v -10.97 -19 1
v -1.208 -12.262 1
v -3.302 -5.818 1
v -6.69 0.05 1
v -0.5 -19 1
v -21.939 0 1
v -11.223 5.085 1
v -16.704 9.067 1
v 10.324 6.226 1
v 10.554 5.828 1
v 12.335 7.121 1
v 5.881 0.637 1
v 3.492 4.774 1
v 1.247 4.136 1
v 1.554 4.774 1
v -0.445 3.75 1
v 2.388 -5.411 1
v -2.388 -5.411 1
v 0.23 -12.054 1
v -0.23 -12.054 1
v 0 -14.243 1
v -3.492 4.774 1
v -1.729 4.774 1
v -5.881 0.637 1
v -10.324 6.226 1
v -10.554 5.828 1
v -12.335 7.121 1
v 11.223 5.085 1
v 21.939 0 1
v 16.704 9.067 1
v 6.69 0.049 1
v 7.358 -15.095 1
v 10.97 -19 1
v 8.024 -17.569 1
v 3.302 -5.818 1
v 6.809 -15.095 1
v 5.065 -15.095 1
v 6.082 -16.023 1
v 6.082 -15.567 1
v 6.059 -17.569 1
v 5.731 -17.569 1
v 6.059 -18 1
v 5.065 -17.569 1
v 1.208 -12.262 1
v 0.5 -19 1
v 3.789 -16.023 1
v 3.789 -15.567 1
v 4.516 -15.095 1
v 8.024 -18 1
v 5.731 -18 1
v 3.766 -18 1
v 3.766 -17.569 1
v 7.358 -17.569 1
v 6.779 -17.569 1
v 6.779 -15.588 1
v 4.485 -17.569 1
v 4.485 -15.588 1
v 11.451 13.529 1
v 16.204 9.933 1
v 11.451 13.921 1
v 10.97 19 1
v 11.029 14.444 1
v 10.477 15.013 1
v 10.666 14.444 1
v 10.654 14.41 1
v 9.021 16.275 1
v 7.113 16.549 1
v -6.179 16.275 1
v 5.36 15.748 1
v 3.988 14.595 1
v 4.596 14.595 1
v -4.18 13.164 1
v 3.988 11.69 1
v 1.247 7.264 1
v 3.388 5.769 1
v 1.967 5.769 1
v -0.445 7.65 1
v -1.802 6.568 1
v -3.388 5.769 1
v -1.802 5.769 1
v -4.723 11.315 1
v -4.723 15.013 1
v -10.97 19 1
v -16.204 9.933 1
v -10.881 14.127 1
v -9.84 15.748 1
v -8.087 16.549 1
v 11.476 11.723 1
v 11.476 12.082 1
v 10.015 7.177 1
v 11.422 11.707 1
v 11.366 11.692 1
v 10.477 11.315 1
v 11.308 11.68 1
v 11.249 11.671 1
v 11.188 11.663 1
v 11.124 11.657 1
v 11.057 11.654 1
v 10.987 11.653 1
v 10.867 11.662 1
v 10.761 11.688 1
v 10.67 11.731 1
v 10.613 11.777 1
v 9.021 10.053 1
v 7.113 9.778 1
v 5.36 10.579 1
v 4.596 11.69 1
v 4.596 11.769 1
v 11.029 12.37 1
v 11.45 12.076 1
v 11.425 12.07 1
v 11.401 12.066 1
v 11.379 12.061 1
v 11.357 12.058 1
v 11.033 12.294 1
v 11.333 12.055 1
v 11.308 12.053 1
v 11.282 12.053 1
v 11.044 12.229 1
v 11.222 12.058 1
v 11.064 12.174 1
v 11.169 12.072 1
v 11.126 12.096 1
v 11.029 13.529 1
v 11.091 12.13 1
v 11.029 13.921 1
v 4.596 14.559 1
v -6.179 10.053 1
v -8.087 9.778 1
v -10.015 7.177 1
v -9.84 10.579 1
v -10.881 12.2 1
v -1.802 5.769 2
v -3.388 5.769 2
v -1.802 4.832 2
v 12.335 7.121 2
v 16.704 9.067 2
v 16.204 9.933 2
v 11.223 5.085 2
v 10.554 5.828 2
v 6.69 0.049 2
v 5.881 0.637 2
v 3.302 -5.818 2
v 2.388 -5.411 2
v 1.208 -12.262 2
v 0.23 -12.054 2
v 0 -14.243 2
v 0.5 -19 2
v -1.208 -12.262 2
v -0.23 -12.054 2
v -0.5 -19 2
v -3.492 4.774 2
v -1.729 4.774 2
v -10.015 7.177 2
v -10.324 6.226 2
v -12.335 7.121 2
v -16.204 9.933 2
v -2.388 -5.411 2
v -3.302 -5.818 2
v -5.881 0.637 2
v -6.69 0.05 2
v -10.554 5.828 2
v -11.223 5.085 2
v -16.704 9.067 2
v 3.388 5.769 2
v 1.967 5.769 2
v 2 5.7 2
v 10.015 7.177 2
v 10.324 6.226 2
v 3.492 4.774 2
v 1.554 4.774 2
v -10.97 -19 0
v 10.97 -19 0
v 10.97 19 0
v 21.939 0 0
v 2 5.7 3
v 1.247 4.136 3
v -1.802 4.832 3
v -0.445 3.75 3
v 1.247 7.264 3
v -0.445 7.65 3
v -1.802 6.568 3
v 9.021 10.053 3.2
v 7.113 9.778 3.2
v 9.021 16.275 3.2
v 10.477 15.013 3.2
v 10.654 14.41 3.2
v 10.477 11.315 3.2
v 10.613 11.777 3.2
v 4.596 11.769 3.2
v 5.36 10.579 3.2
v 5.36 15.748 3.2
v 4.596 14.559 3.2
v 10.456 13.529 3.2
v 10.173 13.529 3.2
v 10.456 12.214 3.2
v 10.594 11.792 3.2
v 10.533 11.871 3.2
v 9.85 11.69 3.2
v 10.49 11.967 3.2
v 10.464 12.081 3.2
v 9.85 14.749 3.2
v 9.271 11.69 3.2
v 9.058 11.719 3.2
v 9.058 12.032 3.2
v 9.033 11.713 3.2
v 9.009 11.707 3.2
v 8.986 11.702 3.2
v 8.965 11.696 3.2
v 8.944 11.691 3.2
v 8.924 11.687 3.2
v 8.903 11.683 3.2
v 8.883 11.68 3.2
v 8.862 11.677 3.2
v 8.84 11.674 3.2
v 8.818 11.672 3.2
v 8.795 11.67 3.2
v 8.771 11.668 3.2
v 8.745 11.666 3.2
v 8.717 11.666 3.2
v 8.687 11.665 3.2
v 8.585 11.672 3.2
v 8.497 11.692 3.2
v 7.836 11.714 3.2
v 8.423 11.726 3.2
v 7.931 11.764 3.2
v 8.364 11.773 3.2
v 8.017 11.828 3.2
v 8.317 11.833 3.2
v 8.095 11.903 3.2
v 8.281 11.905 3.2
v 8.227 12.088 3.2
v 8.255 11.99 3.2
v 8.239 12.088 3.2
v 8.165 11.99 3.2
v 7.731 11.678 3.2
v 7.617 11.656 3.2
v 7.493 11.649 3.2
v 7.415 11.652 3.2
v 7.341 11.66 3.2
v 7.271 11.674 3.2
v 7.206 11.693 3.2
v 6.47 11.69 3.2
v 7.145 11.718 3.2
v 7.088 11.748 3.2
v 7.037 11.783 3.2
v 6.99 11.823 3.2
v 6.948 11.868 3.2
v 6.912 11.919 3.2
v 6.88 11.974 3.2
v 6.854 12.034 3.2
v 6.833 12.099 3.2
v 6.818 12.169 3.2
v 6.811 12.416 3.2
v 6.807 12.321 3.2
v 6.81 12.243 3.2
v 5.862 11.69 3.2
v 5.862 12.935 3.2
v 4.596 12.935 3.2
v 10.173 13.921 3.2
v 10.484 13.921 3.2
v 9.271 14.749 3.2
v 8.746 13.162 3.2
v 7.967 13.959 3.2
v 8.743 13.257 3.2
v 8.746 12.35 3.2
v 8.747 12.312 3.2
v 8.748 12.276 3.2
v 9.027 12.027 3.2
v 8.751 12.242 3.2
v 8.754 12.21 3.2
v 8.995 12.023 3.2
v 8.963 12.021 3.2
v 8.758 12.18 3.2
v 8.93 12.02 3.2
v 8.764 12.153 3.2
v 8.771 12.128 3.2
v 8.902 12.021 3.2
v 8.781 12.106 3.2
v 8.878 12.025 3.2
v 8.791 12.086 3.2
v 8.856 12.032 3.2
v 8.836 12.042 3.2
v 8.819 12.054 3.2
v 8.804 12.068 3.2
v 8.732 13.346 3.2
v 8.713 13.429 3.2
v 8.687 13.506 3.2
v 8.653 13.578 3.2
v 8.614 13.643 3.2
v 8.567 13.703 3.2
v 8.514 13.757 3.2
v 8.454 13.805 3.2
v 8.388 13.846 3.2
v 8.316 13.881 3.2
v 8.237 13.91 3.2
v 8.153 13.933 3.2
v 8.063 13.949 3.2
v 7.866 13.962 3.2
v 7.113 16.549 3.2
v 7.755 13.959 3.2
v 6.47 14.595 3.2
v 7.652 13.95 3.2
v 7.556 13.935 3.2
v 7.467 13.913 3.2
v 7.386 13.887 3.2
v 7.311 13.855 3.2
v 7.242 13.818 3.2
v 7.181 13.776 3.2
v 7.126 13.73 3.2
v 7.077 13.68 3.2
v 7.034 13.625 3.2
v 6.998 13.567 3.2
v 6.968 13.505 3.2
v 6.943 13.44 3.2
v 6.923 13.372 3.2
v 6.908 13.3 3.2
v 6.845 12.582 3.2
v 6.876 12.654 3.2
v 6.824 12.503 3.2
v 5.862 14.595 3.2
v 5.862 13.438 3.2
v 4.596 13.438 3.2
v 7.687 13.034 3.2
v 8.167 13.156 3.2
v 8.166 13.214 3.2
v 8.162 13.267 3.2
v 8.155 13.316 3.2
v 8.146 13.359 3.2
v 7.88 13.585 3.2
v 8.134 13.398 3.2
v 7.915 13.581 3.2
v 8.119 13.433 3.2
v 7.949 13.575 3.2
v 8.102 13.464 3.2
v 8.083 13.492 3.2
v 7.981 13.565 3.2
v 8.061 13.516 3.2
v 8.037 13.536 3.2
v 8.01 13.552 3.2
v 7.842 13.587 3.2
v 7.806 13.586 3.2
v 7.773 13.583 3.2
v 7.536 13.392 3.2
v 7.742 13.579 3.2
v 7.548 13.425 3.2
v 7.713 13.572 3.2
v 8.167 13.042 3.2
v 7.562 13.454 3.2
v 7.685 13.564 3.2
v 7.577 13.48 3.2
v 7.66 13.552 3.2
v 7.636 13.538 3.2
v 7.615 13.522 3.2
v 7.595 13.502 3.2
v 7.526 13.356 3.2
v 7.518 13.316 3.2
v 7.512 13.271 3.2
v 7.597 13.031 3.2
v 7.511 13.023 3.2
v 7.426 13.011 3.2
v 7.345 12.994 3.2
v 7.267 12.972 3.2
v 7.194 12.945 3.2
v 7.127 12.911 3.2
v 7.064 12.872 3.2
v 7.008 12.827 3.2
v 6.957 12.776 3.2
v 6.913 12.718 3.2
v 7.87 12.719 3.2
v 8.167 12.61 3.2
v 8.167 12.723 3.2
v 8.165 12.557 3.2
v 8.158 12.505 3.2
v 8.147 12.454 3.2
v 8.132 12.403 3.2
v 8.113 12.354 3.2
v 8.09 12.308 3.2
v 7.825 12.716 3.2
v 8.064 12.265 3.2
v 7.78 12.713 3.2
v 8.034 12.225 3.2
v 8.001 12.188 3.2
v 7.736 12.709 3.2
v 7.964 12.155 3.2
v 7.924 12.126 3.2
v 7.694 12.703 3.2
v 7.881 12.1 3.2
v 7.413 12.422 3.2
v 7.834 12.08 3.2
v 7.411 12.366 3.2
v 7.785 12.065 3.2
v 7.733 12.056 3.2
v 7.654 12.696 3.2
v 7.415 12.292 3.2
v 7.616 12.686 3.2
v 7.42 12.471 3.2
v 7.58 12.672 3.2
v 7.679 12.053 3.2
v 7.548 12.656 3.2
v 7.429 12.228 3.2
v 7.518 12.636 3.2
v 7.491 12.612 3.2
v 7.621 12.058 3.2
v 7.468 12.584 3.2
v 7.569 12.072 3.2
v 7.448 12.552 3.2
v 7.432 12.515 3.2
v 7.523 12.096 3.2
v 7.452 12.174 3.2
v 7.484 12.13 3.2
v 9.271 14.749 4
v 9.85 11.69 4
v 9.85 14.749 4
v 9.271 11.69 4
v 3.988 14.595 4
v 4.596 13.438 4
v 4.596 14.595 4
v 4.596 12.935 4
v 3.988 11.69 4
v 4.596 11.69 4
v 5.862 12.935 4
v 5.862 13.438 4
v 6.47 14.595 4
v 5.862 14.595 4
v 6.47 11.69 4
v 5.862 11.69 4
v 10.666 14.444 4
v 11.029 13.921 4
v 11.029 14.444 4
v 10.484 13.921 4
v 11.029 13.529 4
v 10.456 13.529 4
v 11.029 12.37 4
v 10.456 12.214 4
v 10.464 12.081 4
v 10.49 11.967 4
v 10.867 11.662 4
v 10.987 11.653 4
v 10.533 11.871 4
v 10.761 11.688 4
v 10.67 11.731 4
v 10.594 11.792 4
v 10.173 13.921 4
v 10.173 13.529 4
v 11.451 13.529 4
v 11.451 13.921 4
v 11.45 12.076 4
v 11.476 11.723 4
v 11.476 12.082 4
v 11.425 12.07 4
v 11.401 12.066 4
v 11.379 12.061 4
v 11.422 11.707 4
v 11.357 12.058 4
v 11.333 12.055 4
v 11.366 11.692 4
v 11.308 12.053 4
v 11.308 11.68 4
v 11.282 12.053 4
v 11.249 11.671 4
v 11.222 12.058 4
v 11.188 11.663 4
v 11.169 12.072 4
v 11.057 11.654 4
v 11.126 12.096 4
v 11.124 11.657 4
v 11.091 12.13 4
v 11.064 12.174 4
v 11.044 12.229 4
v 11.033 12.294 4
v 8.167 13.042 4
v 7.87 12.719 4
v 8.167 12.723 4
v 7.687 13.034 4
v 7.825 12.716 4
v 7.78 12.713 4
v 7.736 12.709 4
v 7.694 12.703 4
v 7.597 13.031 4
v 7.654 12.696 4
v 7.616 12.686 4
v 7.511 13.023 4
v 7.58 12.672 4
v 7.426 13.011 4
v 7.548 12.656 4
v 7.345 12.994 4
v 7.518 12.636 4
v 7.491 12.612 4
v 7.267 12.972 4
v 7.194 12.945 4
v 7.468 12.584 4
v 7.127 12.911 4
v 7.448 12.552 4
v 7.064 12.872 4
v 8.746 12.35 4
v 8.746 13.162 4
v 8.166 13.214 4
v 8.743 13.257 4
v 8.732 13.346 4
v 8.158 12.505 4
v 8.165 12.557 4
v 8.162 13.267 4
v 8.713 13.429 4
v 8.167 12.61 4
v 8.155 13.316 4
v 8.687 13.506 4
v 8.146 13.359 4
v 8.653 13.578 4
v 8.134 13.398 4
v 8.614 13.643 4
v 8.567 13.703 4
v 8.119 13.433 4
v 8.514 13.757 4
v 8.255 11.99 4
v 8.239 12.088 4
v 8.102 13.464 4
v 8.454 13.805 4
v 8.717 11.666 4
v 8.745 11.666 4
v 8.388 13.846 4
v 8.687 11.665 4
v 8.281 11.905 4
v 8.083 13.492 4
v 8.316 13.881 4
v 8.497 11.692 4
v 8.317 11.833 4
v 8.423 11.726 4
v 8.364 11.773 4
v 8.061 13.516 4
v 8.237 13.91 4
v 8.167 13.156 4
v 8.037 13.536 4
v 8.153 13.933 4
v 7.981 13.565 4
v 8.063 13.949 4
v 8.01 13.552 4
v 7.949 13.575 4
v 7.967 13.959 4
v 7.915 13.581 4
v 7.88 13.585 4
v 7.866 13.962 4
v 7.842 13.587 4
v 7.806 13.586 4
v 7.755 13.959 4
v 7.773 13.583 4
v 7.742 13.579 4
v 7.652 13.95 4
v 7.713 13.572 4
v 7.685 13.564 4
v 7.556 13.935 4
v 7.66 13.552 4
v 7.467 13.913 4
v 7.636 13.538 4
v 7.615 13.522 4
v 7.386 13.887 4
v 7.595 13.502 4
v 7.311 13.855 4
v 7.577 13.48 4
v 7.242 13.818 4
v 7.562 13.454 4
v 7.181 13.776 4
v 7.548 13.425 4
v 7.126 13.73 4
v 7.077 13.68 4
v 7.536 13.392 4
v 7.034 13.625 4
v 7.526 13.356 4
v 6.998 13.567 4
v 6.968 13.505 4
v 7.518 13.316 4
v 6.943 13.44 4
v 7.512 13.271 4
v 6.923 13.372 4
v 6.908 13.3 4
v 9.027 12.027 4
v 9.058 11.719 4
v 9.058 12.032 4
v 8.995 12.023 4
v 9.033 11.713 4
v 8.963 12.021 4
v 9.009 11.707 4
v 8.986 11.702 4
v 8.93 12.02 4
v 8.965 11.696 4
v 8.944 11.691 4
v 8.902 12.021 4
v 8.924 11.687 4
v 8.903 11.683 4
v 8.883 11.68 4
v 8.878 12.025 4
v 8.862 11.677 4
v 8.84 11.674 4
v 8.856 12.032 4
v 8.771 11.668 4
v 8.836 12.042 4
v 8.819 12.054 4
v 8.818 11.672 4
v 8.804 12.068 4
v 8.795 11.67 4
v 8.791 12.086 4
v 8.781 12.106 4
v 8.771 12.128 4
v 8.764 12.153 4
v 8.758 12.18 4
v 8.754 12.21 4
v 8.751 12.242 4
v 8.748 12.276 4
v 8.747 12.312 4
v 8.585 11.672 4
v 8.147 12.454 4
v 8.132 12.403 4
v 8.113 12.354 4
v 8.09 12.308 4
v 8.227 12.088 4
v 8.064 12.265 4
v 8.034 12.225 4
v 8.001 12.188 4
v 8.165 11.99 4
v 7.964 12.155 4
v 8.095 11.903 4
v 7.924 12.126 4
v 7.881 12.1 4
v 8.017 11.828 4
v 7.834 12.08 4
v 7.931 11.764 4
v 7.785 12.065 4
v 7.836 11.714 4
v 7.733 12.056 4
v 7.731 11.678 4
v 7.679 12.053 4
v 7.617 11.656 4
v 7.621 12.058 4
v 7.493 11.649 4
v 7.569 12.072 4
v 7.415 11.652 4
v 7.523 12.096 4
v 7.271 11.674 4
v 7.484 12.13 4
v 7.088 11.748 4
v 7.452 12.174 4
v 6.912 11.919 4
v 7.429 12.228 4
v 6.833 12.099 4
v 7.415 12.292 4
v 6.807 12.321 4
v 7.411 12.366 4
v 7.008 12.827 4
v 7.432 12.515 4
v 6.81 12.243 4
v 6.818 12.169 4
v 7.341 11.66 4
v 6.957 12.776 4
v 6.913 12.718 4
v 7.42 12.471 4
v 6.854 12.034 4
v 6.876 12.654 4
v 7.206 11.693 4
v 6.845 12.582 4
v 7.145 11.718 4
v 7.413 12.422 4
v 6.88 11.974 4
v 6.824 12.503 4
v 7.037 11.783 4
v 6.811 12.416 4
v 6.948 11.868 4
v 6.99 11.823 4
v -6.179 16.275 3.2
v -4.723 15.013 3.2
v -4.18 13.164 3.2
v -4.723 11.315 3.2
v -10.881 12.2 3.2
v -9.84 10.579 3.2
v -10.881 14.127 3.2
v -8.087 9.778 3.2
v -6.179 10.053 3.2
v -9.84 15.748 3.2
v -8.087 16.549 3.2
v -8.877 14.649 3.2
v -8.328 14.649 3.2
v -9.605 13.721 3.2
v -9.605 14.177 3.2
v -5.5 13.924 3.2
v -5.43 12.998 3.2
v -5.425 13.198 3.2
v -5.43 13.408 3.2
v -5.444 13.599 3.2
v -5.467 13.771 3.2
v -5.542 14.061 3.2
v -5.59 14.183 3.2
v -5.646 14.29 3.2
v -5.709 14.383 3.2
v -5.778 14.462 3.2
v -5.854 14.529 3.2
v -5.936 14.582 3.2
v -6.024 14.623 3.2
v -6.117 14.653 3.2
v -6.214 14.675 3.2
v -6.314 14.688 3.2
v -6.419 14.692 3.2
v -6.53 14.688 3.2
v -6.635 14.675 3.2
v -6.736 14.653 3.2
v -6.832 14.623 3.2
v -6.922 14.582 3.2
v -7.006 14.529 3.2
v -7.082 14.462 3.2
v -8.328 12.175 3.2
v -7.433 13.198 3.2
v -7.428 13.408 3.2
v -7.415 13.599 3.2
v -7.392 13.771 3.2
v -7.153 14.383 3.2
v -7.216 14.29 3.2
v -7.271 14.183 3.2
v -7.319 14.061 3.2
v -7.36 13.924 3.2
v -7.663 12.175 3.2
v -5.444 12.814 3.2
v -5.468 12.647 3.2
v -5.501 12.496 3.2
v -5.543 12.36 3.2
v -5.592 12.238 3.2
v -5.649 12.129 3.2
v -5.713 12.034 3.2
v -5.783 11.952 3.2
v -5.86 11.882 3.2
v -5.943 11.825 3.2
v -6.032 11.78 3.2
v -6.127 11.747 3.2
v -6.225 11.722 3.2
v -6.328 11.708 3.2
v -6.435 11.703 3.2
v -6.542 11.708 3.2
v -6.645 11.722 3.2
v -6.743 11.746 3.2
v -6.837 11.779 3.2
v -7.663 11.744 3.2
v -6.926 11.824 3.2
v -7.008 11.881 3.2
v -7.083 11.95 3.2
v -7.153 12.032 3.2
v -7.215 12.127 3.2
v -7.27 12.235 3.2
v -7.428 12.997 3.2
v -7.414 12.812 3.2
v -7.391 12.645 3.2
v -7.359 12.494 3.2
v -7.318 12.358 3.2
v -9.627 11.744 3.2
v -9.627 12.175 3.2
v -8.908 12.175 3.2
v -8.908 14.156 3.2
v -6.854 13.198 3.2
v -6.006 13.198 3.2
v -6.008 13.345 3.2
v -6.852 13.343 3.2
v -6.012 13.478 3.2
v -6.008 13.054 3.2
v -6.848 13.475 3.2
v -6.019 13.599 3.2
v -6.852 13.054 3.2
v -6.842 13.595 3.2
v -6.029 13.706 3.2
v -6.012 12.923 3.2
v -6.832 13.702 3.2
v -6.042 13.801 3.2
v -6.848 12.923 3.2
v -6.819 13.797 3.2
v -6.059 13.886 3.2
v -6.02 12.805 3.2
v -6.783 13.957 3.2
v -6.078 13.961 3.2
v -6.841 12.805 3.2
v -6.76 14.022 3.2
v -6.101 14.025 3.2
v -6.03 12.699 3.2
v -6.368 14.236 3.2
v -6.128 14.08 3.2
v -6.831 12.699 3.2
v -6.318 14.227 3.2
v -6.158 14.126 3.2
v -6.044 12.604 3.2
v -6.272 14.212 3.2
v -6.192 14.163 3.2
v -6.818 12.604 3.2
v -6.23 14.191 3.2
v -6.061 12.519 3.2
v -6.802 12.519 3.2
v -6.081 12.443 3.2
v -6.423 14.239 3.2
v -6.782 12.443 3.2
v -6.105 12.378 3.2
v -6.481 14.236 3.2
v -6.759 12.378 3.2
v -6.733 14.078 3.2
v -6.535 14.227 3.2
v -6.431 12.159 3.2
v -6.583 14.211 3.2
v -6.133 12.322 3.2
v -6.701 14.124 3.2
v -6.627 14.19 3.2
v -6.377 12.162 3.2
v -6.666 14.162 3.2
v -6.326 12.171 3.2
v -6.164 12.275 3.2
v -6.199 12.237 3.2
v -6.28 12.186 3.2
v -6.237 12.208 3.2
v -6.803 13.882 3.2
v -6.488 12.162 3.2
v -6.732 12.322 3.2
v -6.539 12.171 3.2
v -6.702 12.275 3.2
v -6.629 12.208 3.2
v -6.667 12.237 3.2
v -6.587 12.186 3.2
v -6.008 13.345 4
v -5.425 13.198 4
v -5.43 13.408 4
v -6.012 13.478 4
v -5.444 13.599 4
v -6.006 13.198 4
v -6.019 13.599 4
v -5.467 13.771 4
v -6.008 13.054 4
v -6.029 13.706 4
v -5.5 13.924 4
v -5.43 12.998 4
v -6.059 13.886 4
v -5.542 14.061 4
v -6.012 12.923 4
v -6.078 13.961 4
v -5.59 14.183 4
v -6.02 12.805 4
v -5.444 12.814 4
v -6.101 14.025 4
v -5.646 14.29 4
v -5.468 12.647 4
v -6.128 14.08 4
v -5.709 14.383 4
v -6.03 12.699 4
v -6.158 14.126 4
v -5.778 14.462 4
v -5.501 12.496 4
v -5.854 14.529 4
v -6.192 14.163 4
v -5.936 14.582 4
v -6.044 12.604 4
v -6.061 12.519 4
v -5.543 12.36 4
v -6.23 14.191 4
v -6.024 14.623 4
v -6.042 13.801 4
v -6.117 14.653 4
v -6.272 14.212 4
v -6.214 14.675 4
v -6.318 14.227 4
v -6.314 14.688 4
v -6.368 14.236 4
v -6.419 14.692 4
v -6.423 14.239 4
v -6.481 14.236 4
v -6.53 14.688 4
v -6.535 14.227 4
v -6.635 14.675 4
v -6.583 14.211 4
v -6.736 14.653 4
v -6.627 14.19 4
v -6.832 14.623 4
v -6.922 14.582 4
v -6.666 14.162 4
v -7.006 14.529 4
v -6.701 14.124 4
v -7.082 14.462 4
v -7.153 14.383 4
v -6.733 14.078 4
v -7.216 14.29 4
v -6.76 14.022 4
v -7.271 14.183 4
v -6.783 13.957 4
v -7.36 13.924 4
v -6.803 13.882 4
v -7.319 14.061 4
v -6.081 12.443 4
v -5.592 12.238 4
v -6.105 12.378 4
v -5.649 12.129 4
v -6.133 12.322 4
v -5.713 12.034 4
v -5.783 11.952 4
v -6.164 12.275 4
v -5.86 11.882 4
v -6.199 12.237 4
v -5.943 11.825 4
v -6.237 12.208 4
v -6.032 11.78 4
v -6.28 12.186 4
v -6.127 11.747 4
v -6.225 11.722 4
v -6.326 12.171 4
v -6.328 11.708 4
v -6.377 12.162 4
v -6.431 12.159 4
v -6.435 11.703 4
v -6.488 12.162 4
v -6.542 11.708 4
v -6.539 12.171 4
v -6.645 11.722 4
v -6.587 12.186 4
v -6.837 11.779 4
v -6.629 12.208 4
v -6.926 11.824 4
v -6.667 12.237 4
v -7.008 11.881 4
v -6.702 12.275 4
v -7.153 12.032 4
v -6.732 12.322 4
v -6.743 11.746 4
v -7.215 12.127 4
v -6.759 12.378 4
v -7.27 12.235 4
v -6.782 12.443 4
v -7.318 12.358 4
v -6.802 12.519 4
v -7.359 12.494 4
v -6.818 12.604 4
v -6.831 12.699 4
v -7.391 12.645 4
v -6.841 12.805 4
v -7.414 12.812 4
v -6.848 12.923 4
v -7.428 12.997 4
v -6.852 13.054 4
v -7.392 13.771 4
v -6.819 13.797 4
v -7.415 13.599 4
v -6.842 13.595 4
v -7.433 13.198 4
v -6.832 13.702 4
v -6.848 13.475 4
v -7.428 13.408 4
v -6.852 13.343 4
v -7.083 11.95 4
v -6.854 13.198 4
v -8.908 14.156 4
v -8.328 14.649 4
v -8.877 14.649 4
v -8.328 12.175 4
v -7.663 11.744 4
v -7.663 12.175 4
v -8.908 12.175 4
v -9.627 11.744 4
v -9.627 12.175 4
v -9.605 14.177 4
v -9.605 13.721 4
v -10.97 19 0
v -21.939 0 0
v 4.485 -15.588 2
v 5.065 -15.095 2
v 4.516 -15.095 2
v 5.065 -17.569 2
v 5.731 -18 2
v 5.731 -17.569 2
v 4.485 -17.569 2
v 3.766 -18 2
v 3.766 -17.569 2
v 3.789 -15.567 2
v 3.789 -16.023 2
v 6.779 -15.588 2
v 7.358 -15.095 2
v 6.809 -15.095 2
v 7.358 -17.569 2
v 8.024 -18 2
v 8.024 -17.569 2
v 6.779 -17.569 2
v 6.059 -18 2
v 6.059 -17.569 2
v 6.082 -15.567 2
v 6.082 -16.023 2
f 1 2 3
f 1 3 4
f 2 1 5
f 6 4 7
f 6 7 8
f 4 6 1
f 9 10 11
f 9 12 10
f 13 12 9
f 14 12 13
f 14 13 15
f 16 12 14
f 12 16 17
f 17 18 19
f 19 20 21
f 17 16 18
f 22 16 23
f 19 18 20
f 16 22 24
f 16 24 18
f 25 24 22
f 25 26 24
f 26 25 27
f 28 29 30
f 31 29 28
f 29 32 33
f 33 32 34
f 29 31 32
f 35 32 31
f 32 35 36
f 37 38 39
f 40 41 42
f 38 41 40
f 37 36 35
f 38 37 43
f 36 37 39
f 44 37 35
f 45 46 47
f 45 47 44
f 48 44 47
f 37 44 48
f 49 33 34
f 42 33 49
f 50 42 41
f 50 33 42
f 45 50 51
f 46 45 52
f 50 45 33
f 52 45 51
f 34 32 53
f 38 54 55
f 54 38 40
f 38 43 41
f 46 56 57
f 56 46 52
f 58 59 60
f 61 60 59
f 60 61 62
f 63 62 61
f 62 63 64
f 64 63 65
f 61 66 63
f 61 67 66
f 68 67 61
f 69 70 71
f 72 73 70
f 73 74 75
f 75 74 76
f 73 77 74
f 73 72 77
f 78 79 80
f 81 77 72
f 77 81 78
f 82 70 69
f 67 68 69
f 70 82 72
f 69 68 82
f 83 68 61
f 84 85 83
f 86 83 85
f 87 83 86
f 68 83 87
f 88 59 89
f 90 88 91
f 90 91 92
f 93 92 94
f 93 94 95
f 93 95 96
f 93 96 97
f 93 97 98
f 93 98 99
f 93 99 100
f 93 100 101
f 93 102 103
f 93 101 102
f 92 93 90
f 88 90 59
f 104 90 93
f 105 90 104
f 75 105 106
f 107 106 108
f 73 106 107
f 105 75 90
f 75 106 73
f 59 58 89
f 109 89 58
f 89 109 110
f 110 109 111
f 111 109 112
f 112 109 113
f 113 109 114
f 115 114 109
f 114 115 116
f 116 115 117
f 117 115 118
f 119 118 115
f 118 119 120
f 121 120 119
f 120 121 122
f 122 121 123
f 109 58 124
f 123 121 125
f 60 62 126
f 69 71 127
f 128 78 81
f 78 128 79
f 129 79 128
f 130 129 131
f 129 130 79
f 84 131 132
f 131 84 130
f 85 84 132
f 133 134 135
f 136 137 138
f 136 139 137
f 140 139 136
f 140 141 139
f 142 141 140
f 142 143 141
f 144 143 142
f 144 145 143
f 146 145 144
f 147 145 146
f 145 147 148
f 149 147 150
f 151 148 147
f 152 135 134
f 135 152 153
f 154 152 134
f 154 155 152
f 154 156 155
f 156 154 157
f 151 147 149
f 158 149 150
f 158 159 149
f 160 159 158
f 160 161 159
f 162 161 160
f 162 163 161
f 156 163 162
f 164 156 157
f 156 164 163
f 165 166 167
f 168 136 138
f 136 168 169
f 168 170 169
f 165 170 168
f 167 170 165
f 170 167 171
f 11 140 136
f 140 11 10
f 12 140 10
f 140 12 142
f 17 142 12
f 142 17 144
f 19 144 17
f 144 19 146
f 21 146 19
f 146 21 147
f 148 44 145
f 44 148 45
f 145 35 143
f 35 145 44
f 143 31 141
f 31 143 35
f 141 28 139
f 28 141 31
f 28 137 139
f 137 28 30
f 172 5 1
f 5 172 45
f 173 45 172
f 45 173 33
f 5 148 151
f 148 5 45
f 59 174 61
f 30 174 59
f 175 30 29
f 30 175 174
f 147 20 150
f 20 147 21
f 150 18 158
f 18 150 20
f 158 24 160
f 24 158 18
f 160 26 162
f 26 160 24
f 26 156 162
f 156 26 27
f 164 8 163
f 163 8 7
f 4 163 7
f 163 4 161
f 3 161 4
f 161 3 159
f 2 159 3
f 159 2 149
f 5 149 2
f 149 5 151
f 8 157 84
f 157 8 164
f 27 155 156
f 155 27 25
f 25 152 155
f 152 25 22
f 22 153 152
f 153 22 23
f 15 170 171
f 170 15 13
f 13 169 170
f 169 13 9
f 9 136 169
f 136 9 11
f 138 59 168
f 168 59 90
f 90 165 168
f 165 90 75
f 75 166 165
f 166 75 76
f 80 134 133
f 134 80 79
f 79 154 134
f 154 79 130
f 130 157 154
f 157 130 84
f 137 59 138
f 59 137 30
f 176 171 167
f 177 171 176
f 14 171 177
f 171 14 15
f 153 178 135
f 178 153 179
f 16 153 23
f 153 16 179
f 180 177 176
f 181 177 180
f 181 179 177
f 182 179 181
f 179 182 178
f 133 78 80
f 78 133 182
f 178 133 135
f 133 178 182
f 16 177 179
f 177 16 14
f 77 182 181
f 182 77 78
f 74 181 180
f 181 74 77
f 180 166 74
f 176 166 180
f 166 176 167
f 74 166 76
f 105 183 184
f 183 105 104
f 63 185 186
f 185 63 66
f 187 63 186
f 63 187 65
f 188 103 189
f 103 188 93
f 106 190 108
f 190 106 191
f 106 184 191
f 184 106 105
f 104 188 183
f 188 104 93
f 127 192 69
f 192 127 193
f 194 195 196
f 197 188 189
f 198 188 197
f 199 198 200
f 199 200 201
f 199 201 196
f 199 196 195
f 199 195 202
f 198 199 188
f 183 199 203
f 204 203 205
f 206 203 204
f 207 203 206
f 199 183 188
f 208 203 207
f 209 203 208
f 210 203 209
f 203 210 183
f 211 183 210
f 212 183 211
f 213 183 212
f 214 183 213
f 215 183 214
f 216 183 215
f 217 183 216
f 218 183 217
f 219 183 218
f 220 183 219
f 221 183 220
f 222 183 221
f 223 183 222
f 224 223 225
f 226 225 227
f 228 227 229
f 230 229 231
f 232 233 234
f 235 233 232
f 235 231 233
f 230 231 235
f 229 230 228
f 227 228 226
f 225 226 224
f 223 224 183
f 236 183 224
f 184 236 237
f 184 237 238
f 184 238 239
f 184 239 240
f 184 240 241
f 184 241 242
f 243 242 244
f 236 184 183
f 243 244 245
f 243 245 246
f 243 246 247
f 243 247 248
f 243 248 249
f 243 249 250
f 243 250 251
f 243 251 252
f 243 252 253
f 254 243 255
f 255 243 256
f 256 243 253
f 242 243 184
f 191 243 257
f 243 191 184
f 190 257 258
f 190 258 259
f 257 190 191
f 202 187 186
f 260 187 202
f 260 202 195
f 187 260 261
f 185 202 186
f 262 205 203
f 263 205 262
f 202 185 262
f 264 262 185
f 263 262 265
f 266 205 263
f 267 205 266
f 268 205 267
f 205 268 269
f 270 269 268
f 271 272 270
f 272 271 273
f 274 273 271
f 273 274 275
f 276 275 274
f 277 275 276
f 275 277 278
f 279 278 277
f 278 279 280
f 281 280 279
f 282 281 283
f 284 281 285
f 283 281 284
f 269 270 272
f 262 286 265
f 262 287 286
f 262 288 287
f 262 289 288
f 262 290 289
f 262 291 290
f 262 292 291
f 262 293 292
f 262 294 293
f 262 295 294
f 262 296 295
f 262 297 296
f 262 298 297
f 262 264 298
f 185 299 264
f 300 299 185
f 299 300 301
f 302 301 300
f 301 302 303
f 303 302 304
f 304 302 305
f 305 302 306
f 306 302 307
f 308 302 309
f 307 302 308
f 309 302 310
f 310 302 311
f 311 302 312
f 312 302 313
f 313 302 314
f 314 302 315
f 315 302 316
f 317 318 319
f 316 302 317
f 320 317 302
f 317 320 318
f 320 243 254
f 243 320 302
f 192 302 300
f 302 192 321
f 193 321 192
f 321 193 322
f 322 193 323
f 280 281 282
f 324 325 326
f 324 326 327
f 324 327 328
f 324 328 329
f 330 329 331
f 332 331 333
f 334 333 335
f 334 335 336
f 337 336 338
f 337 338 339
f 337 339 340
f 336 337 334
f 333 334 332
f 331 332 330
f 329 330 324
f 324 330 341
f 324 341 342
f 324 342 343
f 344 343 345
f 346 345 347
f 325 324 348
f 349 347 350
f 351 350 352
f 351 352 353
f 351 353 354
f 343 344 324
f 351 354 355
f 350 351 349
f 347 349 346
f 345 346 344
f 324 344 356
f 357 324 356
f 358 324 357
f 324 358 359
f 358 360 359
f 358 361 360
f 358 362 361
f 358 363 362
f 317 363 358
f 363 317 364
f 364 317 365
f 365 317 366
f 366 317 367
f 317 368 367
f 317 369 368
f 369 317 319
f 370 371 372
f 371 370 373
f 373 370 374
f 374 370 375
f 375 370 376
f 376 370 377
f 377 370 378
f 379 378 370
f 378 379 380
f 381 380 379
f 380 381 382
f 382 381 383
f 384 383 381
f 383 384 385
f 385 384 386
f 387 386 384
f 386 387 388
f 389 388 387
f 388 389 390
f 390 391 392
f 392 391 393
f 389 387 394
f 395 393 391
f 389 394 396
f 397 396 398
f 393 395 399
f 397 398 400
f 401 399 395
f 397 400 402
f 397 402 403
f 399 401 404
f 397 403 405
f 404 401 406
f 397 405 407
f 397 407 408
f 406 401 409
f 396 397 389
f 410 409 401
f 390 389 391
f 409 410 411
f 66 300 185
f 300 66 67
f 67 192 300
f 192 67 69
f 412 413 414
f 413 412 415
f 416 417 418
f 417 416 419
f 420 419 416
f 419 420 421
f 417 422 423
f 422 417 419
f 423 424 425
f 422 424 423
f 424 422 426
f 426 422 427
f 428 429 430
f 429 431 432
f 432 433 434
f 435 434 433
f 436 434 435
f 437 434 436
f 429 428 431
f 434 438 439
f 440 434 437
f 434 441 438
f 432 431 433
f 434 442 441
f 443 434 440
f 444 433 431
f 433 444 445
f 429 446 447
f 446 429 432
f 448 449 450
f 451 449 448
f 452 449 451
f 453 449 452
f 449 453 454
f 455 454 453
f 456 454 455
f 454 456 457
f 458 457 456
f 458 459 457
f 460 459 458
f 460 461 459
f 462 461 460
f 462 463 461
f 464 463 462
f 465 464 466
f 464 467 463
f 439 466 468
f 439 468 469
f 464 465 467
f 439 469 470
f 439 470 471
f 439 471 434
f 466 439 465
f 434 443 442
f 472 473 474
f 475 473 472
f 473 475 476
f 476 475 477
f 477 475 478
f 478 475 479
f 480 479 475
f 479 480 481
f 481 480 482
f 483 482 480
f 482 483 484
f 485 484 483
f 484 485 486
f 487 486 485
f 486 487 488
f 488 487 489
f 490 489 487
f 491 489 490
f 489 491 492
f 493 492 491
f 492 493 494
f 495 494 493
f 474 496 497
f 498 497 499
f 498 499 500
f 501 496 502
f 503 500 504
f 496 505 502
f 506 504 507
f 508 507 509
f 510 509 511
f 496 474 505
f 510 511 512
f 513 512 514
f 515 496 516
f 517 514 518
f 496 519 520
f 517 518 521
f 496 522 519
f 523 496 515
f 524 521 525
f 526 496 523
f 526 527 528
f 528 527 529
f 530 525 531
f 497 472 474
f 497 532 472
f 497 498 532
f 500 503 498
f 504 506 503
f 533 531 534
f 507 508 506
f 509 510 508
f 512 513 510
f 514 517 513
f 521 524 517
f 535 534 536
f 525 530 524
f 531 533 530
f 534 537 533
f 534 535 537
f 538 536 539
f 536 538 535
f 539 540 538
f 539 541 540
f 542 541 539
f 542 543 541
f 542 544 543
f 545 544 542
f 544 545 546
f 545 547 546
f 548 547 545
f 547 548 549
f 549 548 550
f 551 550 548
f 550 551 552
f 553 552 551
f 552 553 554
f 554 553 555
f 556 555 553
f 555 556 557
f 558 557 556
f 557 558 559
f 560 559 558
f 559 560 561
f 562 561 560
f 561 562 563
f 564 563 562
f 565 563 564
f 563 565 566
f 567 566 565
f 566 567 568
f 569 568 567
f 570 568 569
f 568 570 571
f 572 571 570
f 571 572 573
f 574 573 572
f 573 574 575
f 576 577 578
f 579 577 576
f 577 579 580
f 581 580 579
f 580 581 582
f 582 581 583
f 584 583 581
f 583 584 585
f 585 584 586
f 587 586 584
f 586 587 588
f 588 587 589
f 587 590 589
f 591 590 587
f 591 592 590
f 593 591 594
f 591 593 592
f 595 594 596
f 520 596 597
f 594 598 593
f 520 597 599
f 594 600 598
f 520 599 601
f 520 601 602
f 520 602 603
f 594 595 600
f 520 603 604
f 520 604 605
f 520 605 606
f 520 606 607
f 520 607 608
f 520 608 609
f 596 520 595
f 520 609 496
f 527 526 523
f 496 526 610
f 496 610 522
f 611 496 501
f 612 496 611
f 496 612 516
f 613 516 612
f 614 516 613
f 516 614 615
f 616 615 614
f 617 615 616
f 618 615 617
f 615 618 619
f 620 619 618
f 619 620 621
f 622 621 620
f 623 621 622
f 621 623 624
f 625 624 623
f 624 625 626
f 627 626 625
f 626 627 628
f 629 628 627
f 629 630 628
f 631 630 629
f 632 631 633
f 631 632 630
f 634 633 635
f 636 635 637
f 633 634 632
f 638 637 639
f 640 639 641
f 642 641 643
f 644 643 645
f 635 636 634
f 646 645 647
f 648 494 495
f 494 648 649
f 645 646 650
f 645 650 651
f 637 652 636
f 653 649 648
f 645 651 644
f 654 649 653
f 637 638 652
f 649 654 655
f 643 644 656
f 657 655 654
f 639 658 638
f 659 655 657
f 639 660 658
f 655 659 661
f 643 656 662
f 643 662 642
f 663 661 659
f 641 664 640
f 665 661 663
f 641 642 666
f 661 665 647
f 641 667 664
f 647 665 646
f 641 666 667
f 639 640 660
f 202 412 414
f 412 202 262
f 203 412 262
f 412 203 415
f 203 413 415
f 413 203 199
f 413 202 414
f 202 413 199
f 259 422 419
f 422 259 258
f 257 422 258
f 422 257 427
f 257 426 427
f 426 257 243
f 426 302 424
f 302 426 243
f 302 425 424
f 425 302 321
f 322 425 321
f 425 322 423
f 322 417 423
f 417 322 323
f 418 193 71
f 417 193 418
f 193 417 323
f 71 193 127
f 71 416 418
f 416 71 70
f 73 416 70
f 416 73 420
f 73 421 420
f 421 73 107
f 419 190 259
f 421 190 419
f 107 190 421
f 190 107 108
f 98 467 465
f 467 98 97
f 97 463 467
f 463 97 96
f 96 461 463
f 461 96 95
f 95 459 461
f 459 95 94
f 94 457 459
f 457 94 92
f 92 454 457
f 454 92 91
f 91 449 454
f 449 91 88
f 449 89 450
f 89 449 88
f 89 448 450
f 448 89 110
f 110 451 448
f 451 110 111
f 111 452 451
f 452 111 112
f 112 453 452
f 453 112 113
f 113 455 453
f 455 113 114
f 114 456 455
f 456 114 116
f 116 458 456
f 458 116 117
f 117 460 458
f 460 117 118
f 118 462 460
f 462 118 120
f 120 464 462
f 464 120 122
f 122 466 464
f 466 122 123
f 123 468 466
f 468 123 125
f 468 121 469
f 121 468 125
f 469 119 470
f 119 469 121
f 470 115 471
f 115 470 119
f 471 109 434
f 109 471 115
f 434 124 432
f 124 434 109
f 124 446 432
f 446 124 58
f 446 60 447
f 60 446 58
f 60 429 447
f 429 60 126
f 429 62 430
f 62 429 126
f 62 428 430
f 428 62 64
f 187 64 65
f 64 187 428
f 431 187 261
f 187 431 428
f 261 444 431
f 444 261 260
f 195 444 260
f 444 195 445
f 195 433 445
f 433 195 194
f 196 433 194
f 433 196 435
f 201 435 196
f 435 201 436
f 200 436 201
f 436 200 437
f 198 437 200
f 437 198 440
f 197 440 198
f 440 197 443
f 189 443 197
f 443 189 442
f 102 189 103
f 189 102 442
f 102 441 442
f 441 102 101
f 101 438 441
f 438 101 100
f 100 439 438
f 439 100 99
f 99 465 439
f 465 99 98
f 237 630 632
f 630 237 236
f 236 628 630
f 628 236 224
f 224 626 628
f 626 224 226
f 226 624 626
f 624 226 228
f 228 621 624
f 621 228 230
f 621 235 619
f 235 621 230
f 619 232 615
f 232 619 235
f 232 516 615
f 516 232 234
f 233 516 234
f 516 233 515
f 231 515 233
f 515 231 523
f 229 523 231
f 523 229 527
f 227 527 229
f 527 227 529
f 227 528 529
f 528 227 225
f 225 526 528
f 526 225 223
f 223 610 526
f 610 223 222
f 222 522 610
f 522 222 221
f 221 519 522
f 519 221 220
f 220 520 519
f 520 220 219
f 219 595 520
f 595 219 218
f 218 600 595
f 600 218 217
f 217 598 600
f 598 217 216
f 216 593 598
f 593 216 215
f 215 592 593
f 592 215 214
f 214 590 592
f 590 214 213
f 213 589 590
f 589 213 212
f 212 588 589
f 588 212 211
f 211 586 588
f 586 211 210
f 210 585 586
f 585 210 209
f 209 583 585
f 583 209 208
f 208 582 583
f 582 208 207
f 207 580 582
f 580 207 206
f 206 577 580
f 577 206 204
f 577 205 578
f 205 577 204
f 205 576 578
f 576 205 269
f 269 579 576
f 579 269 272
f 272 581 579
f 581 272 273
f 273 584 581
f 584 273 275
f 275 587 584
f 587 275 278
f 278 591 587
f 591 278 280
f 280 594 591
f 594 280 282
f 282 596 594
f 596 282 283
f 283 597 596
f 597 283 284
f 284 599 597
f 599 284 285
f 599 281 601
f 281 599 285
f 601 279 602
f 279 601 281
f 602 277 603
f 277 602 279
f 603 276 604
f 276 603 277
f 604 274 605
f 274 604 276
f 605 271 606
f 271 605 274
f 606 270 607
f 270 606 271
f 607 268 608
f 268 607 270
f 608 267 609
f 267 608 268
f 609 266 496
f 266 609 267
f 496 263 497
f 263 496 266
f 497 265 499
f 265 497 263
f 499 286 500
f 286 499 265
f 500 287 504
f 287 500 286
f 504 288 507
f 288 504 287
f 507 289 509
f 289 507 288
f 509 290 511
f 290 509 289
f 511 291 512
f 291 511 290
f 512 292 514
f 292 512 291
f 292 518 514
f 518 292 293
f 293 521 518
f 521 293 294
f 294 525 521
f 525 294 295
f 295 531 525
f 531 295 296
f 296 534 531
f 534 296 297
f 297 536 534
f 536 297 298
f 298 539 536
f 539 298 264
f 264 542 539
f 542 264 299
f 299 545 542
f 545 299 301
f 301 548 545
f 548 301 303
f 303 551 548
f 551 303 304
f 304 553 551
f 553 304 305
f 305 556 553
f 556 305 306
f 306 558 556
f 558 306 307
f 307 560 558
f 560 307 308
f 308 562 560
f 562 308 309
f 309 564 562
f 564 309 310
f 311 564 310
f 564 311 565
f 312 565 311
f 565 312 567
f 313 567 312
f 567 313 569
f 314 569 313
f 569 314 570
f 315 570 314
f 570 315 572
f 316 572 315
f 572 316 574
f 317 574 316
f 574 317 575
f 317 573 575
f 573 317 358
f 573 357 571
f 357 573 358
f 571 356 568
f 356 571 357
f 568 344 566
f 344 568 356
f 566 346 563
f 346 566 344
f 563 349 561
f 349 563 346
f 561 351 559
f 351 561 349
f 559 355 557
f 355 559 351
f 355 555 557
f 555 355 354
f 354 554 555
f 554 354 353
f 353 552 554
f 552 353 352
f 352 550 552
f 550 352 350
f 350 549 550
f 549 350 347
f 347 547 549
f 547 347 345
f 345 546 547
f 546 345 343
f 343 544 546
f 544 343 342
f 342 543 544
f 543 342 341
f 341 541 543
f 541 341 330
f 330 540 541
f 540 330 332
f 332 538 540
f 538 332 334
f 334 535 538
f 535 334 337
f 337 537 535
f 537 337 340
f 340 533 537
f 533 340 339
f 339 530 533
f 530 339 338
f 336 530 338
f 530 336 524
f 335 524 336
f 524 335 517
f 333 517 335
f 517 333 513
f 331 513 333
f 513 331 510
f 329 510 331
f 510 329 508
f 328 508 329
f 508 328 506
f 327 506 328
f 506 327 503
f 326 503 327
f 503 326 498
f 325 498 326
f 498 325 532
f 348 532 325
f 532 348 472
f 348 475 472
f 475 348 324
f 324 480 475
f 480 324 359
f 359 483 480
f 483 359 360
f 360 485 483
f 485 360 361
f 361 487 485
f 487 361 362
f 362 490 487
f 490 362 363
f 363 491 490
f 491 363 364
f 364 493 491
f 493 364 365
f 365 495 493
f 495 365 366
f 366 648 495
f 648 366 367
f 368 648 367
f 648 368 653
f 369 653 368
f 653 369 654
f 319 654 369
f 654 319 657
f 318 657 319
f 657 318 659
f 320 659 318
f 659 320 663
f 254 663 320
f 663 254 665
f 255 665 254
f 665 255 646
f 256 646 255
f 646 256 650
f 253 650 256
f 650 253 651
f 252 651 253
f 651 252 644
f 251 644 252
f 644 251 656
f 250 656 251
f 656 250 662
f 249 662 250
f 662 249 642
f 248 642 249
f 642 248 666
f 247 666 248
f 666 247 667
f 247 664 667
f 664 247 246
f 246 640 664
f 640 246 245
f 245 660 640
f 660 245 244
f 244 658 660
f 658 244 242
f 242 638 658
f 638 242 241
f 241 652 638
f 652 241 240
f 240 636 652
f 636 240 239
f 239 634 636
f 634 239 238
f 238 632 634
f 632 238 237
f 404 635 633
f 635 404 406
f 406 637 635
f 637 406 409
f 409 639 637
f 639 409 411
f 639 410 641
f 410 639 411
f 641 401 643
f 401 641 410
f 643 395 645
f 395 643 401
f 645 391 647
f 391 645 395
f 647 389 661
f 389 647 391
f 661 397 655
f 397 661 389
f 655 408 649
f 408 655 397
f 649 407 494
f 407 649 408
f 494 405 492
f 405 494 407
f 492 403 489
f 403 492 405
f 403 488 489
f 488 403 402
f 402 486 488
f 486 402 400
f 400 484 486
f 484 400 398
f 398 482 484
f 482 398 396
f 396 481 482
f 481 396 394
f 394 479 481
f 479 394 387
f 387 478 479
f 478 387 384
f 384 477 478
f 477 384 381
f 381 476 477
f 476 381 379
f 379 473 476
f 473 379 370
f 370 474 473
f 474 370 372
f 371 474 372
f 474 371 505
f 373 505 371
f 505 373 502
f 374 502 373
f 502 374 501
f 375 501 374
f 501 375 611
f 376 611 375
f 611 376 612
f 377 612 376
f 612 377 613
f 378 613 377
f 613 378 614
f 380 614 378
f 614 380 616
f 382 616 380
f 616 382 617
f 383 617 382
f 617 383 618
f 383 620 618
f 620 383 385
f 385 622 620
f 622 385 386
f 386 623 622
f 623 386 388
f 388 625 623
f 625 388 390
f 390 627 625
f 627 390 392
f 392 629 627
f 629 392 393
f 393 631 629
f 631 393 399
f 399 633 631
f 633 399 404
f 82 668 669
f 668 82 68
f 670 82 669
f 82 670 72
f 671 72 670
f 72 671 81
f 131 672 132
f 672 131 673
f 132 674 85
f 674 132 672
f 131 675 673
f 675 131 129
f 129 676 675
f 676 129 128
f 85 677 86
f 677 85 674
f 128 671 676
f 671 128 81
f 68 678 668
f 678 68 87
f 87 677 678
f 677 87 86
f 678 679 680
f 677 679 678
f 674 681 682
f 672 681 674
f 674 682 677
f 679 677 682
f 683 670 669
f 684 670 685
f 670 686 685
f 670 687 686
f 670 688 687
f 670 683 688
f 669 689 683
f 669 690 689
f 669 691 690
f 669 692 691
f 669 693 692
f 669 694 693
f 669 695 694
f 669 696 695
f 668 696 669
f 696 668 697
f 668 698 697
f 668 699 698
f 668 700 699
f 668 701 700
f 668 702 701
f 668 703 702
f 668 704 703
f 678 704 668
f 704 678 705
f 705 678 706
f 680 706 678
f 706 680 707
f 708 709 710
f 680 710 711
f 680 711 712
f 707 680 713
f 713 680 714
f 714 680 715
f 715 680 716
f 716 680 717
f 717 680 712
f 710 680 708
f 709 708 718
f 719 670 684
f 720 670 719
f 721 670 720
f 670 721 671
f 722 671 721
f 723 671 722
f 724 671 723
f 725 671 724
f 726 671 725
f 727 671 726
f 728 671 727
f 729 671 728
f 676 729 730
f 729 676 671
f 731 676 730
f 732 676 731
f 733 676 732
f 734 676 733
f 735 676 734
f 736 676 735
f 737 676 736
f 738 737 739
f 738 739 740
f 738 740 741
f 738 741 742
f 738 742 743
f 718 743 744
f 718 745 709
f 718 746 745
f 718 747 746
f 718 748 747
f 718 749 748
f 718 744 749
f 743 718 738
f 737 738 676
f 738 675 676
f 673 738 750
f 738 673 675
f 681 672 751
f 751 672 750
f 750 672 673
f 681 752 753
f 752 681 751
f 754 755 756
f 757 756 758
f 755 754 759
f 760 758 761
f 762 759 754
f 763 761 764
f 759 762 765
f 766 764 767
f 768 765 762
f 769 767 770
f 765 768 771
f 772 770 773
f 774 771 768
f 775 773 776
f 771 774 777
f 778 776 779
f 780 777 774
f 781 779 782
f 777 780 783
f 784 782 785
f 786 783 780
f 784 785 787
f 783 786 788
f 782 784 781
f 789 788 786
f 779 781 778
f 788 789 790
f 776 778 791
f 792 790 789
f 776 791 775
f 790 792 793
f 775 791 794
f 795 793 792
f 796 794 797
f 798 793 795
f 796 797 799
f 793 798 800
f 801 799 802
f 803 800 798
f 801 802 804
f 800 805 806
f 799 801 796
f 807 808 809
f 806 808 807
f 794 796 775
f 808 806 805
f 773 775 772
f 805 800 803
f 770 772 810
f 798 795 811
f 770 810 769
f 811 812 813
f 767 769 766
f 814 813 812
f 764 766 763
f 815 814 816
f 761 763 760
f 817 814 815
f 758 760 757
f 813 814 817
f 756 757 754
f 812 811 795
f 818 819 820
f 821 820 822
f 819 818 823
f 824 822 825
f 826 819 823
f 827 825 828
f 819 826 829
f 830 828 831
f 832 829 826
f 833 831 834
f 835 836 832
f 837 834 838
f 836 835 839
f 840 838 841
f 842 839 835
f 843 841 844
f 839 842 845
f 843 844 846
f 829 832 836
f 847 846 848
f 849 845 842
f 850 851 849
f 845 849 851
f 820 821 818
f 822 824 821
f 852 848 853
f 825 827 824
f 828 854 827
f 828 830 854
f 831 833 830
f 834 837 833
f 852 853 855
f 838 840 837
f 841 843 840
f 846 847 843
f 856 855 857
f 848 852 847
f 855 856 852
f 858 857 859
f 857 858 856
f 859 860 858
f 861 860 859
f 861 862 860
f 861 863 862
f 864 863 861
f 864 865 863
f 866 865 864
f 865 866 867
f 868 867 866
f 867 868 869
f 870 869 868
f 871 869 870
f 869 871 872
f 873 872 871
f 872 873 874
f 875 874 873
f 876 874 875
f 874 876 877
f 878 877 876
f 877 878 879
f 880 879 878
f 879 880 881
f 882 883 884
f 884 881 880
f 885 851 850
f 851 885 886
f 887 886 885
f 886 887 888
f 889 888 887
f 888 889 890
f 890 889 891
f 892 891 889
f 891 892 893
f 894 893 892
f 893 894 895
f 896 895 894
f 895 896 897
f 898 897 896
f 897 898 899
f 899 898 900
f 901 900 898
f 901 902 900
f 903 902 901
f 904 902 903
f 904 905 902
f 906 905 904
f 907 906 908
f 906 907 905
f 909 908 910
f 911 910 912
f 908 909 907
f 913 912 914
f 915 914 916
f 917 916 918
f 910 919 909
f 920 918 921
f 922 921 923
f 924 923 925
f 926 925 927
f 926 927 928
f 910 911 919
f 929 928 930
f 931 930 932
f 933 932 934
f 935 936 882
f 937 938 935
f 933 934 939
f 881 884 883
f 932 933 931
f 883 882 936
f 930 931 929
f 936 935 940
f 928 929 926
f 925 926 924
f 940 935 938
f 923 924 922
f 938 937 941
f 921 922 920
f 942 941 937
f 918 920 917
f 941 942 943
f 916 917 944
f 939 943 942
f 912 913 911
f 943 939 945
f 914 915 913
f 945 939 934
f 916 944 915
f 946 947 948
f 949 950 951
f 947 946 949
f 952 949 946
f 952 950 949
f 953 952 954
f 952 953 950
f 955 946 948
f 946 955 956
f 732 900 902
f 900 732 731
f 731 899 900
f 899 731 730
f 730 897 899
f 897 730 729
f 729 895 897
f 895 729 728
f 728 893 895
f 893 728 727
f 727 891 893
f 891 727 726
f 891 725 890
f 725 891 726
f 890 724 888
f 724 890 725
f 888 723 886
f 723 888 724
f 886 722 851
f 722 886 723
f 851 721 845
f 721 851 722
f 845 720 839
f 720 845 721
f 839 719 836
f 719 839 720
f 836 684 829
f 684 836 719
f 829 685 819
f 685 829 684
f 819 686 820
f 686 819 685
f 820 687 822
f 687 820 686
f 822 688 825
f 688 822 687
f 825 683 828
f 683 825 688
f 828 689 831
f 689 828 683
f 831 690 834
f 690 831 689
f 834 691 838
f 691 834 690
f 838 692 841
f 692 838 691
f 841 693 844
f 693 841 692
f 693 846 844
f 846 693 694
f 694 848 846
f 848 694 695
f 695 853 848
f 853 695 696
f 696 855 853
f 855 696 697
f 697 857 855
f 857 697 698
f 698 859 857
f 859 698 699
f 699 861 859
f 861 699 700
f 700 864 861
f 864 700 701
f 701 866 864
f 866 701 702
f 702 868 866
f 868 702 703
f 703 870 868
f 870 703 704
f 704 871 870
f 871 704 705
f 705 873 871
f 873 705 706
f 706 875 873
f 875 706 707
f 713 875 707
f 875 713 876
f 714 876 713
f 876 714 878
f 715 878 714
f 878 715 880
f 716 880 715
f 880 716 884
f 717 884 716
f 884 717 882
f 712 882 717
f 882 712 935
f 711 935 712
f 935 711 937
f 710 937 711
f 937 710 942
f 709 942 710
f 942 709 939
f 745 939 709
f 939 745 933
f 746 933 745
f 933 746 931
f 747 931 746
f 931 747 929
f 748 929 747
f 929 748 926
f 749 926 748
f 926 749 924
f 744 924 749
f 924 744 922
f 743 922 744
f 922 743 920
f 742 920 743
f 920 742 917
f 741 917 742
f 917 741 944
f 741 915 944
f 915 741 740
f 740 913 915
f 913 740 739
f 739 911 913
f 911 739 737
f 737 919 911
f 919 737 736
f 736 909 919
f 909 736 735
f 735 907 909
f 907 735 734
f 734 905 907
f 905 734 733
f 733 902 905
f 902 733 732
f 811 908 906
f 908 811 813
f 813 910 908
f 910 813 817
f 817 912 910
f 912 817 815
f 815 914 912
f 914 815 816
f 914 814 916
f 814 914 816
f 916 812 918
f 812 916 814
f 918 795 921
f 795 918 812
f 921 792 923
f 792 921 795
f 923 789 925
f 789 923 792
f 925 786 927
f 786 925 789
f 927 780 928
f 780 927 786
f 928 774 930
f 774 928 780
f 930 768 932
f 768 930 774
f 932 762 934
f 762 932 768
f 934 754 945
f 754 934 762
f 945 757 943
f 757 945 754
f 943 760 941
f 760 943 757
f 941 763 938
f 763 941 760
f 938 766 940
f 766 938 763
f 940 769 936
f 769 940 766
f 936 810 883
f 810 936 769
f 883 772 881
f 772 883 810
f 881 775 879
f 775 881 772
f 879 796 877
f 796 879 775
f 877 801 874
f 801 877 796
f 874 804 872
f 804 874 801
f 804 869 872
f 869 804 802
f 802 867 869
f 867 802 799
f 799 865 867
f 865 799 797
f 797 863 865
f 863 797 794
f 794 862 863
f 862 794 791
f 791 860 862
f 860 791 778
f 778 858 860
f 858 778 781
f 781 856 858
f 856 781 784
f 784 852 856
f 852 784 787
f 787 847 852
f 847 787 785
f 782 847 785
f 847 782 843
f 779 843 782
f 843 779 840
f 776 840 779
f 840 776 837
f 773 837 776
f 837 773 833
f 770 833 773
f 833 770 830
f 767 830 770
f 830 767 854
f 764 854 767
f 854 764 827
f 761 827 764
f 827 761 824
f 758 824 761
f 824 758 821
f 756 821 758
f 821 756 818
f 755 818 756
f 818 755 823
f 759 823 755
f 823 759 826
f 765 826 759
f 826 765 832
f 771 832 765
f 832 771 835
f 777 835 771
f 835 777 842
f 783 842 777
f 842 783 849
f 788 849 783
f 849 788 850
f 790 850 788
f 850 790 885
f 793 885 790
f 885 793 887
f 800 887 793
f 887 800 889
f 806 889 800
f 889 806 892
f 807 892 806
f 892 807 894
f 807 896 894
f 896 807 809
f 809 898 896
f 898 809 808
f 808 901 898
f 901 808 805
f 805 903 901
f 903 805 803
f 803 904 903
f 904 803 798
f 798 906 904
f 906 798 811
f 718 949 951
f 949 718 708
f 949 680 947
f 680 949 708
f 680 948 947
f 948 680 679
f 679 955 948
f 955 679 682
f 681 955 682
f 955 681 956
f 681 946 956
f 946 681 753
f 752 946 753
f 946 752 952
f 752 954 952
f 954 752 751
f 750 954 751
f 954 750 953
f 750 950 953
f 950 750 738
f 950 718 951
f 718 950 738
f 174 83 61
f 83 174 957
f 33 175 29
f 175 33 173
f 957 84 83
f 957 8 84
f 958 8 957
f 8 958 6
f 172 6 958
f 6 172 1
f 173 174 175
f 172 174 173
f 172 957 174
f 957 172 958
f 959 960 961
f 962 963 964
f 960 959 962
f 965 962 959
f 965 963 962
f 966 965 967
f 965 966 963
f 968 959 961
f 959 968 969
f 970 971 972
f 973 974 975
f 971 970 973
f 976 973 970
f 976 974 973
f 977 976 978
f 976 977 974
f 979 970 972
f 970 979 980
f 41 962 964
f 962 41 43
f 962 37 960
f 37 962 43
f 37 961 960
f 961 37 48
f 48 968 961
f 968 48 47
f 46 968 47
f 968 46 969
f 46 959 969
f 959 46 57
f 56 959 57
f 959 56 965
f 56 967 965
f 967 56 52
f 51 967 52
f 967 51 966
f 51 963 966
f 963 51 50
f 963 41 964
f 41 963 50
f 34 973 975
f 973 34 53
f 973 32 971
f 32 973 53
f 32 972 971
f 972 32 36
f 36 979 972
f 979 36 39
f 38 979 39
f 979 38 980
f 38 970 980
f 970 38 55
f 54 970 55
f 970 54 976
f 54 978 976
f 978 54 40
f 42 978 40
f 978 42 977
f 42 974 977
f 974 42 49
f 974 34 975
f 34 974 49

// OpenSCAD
include <../Scripts/18xx tiles basic functions.scad>
hex();
put_tilenr("11");
light_curve(0);
light_curve(4);
small_town_light_curve(2);
put_value("Halt",30);
put_value("10",-30);
